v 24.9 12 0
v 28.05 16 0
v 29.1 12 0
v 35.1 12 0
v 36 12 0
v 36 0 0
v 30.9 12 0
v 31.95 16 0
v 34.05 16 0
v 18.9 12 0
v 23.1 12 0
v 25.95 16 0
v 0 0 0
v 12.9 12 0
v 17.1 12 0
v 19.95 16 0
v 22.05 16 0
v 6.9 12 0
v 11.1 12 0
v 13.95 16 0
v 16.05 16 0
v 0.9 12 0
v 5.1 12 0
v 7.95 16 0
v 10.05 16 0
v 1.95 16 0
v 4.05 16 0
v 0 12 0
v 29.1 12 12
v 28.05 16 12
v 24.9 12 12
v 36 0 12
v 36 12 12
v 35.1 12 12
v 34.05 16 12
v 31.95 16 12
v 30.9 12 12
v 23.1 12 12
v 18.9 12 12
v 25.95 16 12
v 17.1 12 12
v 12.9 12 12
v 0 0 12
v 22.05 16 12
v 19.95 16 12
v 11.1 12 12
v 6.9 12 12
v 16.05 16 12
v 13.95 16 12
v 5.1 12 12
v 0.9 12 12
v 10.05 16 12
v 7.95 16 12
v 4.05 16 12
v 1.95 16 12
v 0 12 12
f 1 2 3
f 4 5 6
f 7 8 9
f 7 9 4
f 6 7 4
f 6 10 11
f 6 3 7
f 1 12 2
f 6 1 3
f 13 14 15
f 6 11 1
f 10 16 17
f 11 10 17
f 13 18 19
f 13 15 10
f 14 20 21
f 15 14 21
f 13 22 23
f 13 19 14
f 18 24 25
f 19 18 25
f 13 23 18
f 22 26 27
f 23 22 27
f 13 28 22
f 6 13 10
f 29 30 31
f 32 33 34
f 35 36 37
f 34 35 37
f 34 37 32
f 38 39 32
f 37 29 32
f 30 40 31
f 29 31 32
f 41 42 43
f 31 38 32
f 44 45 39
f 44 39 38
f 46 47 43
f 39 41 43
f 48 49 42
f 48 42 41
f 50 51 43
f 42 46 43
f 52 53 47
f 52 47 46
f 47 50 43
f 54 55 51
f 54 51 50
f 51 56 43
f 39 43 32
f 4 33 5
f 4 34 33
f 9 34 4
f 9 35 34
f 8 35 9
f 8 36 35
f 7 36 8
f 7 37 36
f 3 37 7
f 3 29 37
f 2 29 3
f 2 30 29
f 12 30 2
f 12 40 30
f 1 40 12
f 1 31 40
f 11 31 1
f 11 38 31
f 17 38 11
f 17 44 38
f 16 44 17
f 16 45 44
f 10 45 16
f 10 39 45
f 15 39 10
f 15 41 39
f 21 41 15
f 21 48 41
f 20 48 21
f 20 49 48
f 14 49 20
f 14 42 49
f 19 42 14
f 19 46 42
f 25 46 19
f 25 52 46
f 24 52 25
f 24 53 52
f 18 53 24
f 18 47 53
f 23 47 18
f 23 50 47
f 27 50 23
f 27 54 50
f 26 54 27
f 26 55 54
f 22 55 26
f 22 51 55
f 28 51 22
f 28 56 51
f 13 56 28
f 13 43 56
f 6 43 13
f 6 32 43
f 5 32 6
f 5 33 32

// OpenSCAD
$fn = 32;

// ----------------------------------------------------------------------
// Gear rack: 6 teeth, pitch 6 mm
// ----------------------------------------------------------------------

// --- parameters (mm) ---
teeth = 6;                // number of teeth
pitch = 6;                // tooth pitch, X
root_w = 4.2;             // tooth width at the root
tip_w = 2.1;              // tooth width at the tip
base_h = 12;              // rack body height, Y
tooth_h = 4;              // tooth height above the body
plate_t = 12;             // rack width, Z (extrusion height)
fit_tol = 0.05;           // declared fit tolerance (prompt contract)
free_tol = 0.2;           // declared free tolerance (prompt contract)

rack_l = teeth * pitch;  // overall length
total_h = base_h + tooth_h;  // overall height

profile = [[0, 0], [36, 0], [36, 12], [35.1, 12], [34.05, 16], [31.95, 16], [30.9, 12], [29.1, 12], [28.05, 16], [25.95, 16], [24.9, 12], [23.1, 12], [22.05, 16], [19.95, 16], [18.9, 12], [17.1, 12], [16.05, 16], [13.95, 16], [12.9, 12], [11.1, 12], [10.05, 16], [7.95, 16], [6.9, 12], [5.1, 12], [4.05, 16], [1.95, 16], [0.9, 12], [0, 12]];  // primary outline, 28 points, counter clockwise

// --- the one profile operation ---
linear_extrude(height = plate_t) polygon(points = profile);
